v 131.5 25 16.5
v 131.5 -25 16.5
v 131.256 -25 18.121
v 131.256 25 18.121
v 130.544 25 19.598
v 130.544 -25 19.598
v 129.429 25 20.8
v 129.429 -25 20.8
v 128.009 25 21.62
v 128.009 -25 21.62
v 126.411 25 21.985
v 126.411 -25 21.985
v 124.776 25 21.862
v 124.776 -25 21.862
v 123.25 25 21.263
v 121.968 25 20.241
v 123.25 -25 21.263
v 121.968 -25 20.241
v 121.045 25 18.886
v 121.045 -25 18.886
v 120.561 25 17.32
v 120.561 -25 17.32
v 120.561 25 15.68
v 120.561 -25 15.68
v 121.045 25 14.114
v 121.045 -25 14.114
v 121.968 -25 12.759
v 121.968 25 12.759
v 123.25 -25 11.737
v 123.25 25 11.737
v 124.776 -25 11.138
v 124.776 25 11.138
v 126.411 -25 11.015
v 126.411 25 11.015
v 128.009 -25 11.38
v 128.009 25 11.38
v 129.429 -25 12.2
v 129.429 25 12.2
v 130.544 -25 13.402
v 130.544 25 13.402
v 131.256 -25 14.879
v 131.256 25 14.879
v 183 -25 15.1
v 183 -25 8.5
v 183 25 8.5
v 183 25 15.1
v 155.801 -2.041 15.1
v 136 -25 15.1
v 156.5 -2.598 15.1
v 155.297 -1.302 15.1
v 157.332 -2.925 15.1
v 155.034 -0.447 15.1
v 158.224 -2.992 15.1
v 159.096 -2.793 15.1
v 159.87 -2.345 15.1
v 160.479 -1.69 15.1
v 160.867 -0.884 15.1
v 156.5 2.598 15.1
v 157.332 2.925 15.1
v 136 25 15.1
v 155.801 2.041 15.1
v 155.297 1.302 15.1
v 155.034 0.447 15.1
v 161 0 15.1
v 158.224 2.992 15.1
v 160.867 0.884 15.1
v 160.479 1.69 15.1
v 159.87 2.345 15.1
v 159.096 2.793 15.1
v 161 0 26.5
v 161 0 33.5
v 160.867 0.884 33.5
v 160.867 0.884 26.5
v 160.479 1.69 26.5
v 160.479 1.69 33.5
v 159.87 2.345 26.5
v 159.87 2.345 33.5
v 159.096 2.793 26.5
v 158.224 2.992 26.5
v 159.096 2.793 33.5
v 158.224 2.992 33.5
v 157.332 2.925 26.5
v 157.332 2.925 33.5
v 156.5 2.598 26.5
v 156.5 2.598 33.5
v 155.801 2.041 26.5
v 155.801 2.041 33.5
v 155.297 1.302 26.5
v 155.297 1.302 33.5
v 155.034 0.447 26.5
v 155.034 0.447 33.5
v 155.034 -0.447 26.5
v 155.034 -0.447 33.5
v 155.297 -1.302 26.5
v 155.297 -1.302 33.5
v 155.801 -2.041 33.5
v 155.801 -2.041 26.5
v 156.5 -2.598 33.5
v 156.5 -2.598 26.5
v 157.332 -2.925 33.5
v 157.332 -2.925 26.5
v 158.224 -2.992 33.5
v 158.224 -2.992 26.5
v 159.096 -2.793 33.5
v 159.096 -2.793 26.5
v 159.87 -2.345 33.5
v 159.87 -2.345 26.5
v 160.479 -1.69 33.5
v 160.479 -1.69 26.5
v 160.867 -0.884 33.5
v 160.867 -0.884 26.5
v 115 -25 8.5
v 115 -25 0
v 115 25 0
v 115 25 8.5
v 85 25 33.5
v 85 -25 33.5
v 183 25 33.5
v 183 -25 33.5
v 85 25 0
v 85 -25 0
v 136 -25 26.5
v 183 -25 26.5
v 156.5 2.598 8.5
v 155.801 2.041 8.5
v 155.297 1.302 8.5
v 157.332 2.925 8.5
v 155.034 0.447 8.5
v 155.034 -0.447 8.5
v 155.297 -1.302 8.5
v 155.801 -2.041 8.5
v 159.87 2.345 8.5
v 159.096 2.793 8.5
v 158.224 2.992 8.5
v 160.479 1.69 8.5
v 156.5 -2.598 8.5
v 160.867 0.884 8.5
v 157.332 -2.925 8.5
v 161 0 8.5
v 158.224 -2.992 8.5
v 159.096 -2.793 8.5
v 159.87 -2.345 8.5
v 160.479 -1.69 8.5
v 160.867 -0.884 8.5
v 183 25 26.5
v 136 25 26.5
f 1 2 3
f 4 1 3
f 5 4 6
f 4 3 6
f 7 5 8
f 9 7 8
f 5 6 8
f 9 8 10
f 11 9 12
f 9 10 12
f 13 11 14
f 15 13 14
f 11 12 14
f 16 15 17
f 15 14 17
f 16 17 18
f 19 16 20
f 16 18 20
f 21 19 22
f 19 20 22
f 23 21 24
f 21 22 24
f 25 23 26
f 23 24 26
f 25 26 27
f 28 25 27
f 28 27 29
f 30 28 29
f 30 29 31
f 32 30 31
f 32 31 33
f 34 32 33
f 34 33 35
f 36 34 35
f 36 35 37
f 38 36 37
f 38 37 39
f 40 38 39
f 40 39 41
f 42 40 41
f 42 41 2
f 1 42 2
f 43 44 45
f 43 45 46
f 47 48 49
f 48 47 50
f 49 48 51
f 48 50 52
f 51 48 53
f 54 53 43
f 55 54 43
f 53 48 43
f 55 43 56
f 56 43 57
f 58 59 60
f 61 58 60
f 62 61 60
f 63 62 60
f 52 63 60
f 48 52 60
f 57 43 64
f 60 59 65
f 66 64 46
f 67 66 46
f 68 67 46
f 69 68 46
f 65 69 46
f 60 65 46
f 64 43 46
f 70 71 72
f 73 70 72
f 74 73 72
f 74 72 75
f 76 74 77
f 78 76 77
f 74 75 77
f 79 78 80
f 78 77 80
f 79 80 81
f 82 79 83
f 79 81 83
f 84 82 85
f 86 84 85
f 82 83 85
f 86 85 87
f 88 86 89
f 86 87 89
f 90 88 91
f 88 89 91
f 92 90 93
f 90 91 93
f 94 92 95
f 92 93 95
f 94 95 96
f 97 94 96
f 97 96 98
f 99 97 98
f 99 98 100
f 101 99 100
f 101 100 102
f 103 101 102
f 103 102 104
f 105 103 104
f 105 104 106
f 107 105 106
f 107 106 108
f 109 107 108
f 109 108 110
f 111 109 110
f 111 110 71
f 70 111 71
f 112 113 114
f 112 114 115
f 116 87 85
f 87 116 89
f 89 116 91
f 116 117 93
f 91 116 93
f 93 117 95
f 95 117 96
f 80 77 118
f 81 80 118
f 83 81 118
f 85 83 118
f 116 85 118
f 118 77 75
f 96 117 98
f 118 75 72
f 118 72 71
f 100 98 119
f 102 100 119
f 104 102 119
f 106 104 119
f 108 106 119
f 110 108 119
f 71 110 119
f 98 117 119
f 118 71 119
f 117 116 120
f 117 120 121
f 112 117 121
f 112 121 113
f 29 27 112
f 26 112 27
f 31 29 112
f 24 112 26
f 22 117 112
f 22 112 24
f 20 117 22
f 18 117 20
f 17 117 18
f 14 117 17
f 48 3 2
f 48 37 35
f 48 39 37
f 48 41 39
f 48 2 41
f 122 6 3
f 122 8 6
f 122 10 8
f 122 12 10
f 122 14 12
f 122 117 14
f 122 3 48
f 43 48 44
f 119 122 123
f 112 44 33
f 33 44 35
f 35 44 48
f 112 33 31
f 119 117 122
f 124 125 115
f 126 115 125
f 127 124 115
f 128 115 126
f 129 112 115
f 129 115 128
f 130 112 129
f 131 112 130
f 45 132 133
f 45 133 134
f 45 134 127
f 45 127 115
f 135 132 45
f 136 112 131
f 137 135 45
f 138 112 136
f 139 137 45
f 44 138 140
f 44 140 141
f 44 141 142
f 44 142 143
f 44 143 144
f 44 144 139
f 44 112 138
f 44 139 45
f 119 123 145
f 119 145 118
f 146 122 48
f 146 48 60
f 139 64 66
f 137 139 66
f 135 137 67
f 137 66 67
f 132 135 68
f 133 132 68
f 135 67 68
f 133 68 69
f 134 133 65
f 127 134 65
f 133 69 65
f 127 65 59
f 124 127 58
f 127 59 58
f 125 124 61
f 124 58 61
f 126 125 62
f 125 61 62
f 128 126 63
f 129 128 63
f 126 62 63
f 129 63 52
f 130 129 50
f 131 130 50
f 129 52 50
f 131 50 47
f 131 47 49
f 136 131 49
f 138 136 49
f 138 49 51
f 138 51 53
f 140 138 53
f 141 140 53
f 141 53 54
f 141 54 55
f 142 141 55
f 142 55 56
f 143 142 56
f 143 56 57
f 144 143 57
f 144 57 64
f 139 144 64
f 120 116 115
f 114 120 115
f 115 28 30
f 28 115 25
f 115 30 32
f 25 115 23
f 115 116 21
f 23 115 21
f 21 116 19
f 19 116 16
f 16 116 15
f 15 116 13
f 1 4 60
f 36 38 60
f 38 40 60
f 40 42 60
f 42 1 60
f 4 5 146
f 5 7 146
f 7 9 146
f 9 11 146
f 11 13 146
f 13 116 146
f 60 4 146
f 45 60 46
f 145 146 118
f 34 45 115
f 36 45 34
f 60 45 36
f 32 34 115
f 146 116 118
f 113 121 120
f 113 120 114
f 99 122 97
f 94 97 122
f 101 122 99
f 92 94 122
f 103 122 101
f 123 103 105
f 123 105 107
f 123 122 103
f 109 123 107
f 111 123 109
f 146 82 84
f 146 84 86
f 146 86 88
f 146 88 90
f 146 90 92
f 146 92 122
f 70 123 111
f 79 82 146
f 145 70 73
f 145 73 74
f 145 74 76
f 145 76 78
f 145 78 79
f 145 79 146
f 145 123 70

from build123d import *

# Parameters (mm, degrees)
F0_W      = 366
F0_H      = 33.5
F1_DEPTH  = 25
F2_W      = 50
F2_H      = 11.4
F3_DEPTH  = 47
F4_W      = 50
F4_H      = 11.4
F5_DEPTH  = 53
F6_W      = 68
F6_H      = 8.5
F7_DEPTH  = 100
F8_W      = 170
F8_H      = 21
F9_DEPTH  = 79.8
F10_R     = 11.5
F11_DEPTH = 56
F12_W     = 78.038405627
F12_H     = 72.1084345132
F13_DEPTH = 268.001
F14_R     = 3
F15_DEPTH = 50
F16_R     = 5.5
F17_DEPTH = 100


with BuildPart() as f1:
    # F0 (on Front) → F1 (new body, symmetric)
    with BuildSketch(Plane.XZ):
        with Locations((0, 16.75)):
            Rectangle(F0_W, F0_H)
    extrude(amount=F1_DEPTH, both=True)

    # F2 (on face) → F3 (cut)
    with BuildSketch(Plane.YZ.offset(183)):
        with Locations((0, 20.8)):
            Rectangle(F2_W, F2_H)
    extrude(amount=-F3_DEPTH, mode=Mode.SUBTRACT)

    # F4 (on face) → F5 (cut)
    with BuildSketch(Plane(origin=(-183, 0, 0), x_dir=(0, -1, 0), z_dir=(-1, 0, 0))):
        with Locations((0, 20.8)):
            Rectangle(F4_W, F4_H)
    extrude(amount=-F5_DEPTH, mode=Mode.SUBTRACT)

    # F6 (on face) → F7 (cut)
    with BuildSketch(Plane.XZ.offset(25)):
        with Locations((-149, 4.25)):
            Rectangle(F6_W, F6_H)
        with Locations((149, 4.25)):
            Rectangle(F6_W, F6_H)
    extrude(amount=-F7_DEPTH, mode=Mode.SUBTRACT)

    # F8 (on face) → F9 (cut)
    with BuildSketch(Plane.XZ.offset(25)):
        with Locations((0, 23)):
            Rectangle(F8_W, F8_H)
    extrude(amount=-F9_DEPTH, mode=Mode.SUBTRACT)

    # F10 (on face) → F11 (cut)
    with BuildSketch(Plane.XY.offset(12.5)):
        Circle(F10_R)
    extrude(amount=-F11_DEPTH, mode=Mode.SUBTRACT)

    # F12 (on face) → F13 (cut, through all)
    with BuildSketch(Plane(origin=(85, 0, 0), x_dir=(0, -1, 0), z_dir=(-1, 0, 0))):
        with Locations((0.1186002046, 15.0473779067)):
            Rectangle(F12_W, F12_H)
    extrude(amount=F13_DEPTH, mode=Mode.SUBTRACT)

    # F14 (on face) → F15 (cut)
    with BuildSketch(Plane.XY.offset(33.5)):
        with Locations((158, 0)):
            Circle(F14_R)
    extrude(amount=-F15_DEPTH, mode=Mode.SUBTRACT)

    # F16 (on face) → F17 (cut)
    with BuildSketch(Plane.XZ.offset(25)):
        with Locations((126, 16.5)):
            Circle(F16_R)
    extrude(amount=-F17_DEPTH, mode=Mode.SUBTRACT)


solid = f1.part
